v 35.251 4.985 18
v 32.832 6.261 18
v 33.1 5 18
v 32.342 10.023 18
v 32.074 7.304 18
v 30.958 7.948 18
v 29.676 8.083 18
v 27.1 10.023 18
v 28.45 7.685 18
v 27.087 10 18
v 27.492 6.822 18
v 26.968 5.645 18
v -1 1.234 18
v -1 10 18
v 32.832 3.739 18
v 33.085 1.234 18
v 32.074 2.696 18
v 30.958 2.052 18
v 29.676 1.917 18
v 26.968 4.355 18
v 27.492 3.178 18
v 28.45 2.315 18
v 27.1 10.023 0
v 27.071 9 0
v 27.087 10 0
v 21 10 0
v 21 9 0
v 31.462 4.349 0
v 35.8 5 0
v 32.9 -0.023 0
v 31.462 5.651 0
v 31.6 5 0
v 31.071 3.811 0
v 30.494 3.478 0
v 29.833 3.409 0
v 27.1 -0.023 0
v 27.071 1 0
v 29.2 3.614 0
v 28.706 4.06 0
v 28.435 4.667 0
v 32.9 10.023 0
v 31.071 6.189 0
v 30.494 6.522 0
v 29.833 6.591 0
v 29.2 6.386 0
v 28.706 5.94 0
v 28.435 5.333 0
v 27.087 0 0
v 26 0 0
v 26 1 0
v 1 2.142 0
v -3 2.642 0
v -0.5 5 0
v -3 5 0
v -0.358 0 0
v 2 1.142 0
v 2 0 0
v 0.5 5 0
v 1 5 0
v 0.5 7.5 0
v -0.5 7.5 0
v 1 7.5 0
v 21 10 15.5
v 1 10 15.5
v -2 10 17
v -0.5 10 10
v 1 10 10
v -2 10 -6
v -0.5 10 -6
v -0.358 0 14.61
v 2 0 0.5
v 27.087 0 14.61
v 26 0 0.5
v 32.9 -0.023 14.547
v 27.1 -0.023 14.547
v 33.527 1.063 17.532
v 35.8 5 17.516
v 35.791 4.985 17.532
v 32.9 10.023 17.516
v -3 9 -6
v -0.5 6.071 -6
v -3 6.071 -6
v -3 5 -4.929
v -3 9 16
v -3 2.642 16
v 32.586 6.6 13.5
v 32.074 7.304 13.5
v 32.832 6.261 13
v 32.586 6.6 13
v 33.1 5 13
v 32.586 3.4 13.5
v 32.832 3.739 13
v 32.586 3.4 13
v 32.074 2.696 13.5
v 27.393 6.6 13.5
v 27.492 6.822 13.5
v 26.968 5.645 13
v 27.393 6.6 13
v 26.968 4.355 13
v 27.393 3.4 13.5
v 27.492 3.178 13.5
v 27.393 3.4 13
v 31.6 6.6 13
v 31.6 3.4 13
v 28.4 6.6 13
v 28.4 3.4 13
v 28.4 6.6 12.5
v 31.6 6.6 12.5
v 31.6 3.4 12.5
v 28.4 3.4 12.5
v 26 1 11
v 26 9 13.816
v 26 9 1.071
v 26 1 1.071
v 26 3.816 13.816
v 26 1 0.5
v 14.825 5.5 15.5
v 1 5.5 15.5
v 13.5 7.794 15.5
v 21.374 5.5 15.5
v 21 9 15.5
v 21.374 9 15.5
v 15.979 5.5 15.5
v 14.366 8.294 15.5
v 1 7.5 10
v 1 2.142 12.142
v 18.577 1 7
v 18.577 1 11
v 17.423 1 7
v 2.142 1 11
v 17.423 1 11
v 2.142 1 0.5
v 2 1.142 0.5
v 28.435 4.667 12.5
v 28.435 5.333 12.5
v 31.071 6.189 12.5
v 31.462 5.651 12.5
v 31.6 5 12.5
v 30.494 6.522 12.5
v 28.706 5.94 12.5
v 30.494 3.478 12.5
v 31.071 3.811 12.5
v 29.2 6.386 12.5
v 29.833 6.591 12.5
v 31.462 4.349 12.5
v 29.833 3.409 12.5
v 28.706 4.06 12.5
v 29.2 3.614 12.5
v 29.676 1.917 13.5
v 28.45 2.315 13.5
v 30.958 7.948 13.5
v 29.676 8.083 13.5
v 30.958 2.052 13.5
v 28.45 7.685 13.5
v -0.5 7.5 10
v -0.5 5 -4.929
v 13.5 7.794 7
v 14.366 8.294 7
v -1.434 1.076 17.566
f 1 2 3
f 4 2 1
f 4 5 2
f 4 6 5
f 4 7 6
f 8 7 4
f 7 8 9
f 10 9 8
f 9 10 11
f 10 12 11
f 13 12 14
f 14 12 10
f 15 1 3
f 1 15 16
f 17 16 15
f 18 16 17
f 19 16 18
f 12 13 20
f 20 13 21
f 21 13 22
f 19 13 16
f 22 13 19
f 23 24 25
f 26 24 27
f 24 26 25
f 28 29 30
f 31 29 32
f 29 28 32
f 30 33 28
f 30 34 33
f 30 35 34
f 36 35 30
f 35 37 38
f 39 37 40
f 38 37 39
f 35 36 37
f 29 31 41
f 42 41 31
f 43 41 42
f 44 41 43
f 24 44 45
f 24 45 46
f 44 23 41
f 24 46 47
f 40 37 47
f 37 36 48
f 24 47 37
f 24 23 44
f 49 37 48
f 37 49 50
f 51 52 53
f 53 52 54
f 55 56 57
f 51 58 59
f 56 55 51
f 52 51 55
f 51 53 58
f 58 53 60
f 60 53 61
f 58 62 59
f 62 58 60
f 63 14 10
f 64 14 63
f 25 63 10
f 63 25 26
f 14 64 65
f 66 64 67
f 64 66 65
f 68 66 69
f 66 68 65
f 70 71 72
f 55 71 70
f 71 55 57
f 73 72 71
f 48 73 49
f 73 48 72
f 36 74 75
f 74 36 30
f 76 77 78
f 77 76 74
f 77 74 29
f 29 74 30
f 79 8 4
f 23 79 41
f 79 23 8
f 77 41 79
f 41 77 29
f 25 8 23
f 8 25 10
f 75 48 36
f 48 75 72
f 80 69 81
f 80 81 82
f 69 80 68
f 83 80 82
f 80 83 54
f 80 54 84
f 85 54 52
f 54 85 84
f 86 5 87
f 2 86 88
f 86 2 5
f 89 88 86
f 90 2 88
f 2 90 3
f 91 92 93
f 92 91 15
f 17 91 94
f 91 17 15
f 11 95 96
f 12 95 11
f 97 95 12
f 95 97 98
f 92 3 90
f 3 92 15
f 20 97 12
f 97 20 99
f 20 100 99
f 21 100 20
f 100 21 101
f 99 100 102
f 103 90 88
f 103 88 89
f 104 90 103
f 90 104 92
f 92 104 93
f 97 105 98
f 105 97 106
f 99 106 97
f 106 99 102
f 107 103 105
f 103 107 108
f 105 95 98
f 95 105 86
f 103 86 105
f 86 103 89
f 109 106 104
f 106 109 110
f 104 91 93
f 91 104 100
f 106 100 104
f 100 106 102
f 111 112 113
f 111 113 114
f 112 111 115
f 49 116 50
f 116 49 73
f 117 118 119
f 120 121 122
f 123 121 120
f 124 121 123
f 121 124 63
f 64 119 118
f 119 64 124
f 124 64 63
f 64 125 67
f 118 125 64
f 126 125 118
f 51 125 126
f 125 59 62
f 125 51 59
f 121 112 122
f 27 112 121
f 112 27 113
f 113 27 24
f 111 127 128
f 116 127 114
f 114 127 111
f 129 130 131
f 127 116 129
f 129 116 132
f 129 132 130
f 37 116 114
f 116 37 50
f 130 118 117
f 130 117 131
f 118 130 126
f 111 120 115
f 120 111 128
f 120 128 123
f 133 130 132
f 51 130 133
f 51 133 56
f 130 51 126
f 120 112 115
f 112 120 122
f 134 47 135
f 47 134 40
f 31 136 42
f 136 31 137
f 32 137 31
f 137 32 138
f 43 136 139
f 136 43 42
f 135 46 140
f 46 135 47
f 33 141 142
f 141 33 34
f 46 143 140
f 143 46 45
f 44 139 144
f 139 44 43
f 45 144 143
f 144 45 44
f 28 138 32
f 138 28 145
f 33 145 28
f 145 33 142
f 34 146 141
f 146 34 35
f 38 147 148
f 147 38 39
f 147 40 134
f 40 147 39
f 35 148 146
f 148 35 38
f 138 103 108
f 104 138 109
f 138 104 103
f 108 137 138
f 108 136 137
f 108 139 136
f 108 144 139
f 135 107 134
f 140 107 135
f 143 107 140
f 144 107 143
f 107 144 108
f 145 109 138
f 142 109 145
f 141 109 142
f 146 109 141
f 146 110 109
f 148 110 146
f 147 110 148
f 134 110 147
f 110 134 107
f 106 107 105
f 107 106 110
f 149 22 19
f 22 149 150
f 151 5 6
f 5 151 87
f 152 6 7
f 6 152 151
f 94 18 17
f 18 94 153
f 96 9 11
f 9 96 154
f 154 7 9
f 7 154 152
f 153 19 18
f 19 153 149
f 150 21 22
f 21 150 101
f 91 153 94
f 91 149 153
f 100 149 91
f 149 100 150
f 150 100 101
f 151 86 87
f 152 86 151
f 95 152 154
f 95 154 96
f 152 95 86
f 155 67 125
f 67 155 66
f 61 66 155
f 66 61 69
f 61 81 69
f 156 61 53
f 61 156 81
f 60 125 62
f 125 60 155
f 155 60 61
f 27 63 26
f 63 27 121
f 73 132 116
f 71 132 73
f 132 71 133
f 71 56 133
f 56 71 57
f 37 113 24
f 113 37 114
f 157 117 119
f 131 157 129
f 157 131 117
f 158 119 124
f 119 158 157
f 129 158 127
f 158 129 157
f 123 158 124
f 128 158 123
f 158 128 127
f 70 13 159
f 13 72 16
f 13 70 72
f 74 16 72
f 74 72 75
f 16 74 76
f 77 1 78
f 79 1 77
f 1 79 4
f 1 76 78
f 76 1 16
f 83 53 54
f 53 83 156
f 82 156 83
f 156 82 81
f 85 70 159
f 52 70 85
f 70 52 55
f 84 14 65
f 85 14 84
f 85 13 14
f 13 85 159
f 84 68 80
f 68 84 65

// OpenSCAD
// PRUSA iteration3
// Fan nozzle
// GNU GPL v3
// Josef Průša <iam@josefprusa.cz> and contributors
// http://www.reprap.org/wiki/Prusa_Mendel
// http://prusamendel.org

module fan_nozzle(){
    
	difference(){
		union(){
			cube([32,10,18]); // Main cube
			translate([30,5,0])cylinder(r=5.8,h = 18, $fn=6);
			translate([-3,0,-6]) cube([3,10,24]);
		}

		// Mounting screw
		translate([30,5,-10])cylinder(r=3.2/2,h = 24.5-0.2, $fn=15); // Screw cut
		intersection(){
			translate([30,5,9])cylinder(r=3.1,h = 25, $fn=15); // head cut
			translate([30,5,17-3.5]) cube([6.2,3.2,1], center=true);
		}
		translate([30,5,17-4]) cube([3.2,3.2,1], center=true);
		translate([30,5,17-3.5])cylinder(r=3.1,h = 20, $fn=15); // head cut
		translate([-0.5,7.5,0])cube([10,10,10]);
		// Fan entry hole
		translate([1,10-1.5,-1])cube([20,3,16.5]);
		translate([1,10-1.5,-1-5])cube([18,3,16.5]);

		// Airway cutout
		difference(){
			translate([1,1,-1])cube([25,8,16.5]);
			translate([0,0,10])rotate([45,0,0])cube([30,8,16.5]);
			translate([-1,-10,-1])rotate([0,0,45])cube([10,8,30]);
			translate([20,0,16])rotate([0,20,0])cube([10,20,10]);
		}

		translate([2,-1,-4.5])cube([24,3,5]);
		translate([22,1,-2])rotate([0,45,0])cube([5,8,5]);
		//translate([22.4,0,-3.1])rotate([0,45,0])cube([5,2,5]);

	}

// Air director
translate([18,0,7])rotate([0,0,30])cube([1,9,10]);


}

module fancy_corners(){
    
    translate([-10,-10.5,15])rotate([-20,0,0])cube([50,10,15]);
    translate([-16,-10.5,17.5])rotate([0,45,0])cube([10,30,15]);
    
    translate([46.5,-10.5,16])rotate([0,-45,30])cube([10,30,15]);
    translate([28.62,-10.5,16])rotate([0,-45,-30])cube([10,30,15]);

    translate([-5,-1,-7])rotate([0,0,0]) cube([10,6,7]);
    translate([-0.5,-1,-7])rotate([0,0,0]) cube([1,15,7]);
    translate([-5,4,-11])rotate([45,0,0]) cube([10,5,5]);

    //left cut
    translate([-6.5,-8,-5])rotate([0,0,45])cube([10,10,45]);
    translate([-7,-5,12])rotate([0,-45,0])cube([10,30,15]);
    
    translate([-7,5,-10])rotate([0,0,45])cube([10,10,35]);
    
    }

module fan_n(){
difference(){
fan_nozzle();
fancy_corners();    
//translate([2,3.5,17.5])linear_extrude(height = 0.6) {scale(0.1)text("! HOT !", size = 60, font = "Helvetica Neue:style=Bold");}
}
}

fan_n();
